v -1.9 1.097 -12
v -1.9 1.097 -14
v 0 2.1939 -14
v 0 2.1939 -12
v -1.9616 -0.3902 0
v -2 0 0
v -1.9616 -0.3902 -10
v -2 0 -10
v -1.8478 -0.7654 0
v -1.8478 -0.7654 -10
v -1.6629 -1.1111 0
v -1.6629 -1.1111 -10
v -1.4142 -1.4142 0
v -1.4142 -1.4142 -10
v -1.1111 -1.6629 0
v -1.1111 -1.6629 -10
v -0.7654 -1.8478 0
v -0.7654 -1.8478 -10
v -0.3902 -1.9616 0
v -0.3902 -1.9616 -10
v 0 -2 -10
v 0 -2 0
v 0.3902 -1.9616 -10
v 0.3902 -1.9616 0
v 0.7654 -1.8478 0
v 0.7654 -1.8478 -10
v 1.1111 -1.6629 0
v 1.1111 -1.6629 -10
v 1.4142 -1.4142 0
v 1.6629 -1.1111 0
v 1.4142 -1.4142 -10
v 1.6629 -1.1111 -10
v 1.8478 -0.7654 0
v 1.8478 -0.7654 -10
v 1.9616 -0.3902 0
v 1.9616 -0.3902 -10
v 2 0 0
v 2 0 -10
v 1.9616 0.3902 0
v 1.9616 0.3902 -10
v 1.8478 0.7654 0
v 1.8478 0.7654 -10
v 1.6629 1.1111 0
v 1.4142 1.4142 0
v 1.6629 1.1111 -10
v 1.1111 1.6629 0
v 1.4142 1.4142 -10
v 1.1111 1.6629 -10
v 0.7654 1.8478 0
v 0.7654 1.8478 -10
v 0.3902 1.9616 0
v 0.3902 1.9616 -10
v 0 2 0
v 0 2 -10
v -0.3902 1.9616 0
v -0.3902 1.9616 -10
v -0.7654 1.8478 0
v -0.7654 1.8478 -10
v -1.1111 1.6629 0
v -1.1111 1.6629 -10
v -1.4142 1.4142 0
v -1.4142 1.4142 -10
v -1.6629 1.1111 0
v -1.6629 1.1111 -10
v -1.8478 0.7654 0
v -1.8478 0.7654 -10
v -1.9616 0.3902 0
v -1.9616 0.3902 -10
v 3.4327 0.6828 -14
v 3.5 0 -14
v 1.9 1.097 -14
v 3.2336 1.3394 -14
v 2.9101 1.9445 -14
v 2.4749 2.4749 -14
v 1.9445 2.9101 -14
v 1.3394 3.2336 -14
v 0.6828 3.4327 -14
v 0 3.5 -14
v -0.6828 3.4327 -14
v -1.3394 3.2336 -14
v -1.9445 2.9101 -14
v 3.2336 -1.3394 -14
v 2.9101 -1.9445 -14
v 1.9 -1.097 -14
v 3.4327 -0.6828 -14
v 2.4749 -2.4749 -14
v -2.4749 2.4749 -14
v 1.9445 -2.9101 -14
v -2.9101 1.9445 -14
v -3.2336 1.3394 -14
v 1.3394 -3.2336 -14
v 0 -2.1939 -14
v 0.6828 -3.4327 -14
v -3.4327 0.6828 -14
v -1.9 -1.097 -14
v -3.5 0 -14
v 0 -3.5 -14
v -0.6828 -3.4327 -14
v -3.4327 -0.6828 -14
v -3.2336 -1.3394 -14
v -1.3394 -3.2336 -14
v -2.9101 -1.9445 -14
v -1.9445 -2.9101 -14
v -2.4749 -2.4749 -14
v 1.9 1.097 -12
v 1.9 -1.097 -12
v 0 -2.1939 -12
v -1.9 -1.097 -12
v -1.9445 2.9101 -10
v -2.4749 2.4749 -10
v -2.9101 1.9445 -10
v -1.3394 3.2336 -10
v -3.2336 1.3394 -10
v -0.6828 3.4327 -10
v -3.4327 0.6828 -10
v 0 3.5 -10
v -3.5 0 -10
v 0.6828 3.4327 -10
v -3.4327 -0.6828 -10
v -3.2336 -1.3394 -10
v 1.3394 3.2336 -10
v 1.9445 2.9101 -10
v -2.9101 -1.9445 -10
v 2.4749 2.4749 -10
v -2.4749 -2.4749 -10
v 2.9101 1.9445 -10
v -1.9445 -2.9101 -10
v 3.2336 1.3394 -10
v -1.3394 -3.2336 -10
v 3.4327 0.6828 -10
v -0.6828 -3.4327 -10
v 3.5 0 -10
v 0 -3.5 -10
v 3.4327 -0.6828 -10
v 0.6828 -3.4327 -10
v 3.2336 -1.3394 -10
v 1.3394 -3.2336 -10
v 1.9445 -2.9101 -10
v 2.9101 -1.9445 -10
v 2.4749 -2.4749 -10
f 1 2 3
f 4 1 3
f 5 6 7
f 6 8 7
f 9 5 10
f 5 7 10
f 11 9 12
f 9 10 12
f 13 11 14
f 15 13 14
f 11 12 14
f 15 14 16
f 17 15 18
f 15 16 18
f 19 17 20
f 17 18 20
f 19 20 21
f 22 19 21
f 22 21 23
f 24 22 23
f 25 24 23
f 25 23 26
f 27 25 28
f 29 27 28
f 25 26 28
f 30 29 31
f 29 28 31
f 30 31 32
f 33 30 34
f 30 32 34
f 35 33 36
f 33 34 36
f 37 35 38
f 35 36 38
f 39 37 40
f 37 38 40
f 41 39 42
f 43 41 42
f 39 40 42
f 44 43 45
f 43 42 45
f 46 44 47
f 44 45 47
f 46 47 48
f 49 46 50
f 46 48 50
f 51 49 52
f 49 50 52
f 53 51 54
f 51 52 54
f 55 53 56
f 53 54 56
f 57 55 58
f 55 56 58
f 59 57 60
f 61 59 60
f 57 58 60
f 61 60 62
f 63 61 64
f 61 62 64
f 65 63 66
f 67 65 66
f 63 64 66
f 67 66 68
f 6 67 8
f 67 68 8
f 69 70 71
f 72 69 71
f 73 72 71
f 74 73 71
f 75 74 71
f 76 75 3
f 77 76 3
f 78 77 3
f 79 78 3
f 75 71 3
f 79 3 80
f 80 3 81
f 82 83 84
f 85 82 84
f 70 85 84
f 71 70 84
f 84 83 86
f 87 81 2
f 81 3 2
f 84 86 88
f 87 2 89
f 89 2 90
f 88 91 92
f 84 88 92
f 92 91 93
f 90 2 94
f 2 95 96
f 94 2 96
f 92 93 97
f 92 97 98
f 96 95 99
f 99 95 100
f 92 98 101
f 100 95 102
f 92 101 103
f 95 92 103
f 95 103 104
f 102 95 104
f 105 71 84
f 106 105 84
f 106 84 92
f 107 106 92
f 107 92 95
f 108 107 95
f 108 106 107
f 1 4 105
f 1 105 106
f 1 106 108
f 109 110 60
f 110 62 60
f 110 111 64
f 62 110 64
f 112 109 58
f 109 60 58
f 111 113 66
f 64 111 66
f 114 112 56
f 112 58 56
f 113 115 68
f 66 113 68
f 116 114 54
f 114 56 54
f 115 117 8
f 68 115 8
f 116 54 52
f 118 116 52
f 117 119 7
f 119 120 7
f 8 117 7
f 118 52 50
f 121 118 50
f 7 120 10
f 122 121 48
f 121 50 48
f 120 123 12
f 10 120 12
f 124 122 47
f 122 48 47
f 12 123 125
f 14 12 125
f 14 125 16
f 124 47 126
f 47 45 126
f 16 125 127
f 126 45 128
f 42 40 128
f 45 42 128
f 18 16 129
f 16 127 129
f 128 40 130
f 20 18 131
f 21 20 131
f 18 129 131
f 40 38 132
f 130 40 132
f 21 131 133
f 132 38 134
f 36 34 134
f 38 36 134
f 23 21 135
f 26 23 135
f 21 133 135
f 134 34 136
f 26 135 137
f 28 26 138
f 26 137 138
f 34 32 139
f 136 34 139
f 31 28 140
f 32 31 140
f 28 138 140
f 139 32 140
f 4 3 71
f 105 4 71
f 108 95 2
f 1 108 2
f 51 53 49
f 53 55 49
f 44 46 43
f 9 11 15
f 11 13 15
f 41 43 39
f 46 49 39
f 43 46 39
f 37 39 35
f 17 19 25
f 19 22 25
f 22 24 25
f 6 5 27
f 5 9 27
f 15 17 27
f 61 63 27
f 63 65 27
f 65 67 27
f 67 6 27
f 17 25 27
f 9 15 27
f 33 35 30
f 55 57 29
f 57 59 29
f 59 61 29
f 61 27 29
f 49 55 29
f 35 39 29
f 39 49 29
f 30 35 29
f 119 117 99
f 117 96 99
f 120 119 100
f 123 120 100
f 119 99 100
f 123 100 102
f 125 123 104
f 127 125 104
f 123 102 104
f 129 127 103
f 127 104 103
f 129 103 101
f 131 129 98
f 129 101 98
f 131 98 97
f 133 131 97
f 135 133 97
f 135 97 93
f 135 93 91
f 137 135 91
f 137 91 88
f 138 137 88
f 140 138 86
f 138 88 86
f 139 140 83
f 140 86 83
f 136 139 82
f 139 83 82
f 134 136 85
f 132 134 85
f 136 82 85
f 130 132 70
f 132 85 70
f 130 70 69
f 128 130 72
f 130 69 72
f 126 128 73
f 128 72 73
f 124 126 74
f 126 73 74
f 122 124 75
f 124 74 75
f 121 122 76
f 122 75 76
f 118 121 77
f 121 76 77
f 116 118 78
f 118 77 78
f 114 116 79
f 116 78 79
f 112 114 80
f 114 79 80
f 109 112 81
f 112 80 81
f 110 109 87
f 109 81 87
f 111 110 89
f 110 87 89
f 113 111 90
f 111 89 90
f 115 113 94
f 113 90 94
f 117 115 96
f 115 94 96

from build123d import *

# Parameters (mm, degrees)
CUT_EXTRUDE_1_DEPTH = 2


with BuildPart() as part:
    # 草图1 → 旋转1 (revolve)
    with BuildSketch(Plane(origin=(0, 0, 0), x_dir=(1, 0, 0), z_dir=(0, 1, 0)), mode=Mode.PRIVATE) as revolve_1_sk:
        Polygon((0, 0), (2, 0), (2, 10), (3.5, 10), (3.5, 14), (0, 14), align=None)
    revolve(revolve_1_sk.sketch.rotate(Axis((0, 0, -14), (0, 0, 1)), 180), axis=Axis((0, 0, -14), (0, 0, 1)))

    # 草图2 → 切除-拉伸1 (cut)
    with BuildSketch(Plane(origin=(0, 0, -14), x_dir=(-1, 0, 0), z_dir=(0, 0, -1))):
        Polygon((0, 2.193931023), (-1.9, 1.096965511), (-1.9, -1.096965511), (0, -2.193931023), (1.9, -1.096965511), (1.9, 1.096965511), align=None)
    extrude(amount=-CUT_EXTRUDE_1_DEPTH, mode=Mode.SUBTRACT)


solid = part.part
